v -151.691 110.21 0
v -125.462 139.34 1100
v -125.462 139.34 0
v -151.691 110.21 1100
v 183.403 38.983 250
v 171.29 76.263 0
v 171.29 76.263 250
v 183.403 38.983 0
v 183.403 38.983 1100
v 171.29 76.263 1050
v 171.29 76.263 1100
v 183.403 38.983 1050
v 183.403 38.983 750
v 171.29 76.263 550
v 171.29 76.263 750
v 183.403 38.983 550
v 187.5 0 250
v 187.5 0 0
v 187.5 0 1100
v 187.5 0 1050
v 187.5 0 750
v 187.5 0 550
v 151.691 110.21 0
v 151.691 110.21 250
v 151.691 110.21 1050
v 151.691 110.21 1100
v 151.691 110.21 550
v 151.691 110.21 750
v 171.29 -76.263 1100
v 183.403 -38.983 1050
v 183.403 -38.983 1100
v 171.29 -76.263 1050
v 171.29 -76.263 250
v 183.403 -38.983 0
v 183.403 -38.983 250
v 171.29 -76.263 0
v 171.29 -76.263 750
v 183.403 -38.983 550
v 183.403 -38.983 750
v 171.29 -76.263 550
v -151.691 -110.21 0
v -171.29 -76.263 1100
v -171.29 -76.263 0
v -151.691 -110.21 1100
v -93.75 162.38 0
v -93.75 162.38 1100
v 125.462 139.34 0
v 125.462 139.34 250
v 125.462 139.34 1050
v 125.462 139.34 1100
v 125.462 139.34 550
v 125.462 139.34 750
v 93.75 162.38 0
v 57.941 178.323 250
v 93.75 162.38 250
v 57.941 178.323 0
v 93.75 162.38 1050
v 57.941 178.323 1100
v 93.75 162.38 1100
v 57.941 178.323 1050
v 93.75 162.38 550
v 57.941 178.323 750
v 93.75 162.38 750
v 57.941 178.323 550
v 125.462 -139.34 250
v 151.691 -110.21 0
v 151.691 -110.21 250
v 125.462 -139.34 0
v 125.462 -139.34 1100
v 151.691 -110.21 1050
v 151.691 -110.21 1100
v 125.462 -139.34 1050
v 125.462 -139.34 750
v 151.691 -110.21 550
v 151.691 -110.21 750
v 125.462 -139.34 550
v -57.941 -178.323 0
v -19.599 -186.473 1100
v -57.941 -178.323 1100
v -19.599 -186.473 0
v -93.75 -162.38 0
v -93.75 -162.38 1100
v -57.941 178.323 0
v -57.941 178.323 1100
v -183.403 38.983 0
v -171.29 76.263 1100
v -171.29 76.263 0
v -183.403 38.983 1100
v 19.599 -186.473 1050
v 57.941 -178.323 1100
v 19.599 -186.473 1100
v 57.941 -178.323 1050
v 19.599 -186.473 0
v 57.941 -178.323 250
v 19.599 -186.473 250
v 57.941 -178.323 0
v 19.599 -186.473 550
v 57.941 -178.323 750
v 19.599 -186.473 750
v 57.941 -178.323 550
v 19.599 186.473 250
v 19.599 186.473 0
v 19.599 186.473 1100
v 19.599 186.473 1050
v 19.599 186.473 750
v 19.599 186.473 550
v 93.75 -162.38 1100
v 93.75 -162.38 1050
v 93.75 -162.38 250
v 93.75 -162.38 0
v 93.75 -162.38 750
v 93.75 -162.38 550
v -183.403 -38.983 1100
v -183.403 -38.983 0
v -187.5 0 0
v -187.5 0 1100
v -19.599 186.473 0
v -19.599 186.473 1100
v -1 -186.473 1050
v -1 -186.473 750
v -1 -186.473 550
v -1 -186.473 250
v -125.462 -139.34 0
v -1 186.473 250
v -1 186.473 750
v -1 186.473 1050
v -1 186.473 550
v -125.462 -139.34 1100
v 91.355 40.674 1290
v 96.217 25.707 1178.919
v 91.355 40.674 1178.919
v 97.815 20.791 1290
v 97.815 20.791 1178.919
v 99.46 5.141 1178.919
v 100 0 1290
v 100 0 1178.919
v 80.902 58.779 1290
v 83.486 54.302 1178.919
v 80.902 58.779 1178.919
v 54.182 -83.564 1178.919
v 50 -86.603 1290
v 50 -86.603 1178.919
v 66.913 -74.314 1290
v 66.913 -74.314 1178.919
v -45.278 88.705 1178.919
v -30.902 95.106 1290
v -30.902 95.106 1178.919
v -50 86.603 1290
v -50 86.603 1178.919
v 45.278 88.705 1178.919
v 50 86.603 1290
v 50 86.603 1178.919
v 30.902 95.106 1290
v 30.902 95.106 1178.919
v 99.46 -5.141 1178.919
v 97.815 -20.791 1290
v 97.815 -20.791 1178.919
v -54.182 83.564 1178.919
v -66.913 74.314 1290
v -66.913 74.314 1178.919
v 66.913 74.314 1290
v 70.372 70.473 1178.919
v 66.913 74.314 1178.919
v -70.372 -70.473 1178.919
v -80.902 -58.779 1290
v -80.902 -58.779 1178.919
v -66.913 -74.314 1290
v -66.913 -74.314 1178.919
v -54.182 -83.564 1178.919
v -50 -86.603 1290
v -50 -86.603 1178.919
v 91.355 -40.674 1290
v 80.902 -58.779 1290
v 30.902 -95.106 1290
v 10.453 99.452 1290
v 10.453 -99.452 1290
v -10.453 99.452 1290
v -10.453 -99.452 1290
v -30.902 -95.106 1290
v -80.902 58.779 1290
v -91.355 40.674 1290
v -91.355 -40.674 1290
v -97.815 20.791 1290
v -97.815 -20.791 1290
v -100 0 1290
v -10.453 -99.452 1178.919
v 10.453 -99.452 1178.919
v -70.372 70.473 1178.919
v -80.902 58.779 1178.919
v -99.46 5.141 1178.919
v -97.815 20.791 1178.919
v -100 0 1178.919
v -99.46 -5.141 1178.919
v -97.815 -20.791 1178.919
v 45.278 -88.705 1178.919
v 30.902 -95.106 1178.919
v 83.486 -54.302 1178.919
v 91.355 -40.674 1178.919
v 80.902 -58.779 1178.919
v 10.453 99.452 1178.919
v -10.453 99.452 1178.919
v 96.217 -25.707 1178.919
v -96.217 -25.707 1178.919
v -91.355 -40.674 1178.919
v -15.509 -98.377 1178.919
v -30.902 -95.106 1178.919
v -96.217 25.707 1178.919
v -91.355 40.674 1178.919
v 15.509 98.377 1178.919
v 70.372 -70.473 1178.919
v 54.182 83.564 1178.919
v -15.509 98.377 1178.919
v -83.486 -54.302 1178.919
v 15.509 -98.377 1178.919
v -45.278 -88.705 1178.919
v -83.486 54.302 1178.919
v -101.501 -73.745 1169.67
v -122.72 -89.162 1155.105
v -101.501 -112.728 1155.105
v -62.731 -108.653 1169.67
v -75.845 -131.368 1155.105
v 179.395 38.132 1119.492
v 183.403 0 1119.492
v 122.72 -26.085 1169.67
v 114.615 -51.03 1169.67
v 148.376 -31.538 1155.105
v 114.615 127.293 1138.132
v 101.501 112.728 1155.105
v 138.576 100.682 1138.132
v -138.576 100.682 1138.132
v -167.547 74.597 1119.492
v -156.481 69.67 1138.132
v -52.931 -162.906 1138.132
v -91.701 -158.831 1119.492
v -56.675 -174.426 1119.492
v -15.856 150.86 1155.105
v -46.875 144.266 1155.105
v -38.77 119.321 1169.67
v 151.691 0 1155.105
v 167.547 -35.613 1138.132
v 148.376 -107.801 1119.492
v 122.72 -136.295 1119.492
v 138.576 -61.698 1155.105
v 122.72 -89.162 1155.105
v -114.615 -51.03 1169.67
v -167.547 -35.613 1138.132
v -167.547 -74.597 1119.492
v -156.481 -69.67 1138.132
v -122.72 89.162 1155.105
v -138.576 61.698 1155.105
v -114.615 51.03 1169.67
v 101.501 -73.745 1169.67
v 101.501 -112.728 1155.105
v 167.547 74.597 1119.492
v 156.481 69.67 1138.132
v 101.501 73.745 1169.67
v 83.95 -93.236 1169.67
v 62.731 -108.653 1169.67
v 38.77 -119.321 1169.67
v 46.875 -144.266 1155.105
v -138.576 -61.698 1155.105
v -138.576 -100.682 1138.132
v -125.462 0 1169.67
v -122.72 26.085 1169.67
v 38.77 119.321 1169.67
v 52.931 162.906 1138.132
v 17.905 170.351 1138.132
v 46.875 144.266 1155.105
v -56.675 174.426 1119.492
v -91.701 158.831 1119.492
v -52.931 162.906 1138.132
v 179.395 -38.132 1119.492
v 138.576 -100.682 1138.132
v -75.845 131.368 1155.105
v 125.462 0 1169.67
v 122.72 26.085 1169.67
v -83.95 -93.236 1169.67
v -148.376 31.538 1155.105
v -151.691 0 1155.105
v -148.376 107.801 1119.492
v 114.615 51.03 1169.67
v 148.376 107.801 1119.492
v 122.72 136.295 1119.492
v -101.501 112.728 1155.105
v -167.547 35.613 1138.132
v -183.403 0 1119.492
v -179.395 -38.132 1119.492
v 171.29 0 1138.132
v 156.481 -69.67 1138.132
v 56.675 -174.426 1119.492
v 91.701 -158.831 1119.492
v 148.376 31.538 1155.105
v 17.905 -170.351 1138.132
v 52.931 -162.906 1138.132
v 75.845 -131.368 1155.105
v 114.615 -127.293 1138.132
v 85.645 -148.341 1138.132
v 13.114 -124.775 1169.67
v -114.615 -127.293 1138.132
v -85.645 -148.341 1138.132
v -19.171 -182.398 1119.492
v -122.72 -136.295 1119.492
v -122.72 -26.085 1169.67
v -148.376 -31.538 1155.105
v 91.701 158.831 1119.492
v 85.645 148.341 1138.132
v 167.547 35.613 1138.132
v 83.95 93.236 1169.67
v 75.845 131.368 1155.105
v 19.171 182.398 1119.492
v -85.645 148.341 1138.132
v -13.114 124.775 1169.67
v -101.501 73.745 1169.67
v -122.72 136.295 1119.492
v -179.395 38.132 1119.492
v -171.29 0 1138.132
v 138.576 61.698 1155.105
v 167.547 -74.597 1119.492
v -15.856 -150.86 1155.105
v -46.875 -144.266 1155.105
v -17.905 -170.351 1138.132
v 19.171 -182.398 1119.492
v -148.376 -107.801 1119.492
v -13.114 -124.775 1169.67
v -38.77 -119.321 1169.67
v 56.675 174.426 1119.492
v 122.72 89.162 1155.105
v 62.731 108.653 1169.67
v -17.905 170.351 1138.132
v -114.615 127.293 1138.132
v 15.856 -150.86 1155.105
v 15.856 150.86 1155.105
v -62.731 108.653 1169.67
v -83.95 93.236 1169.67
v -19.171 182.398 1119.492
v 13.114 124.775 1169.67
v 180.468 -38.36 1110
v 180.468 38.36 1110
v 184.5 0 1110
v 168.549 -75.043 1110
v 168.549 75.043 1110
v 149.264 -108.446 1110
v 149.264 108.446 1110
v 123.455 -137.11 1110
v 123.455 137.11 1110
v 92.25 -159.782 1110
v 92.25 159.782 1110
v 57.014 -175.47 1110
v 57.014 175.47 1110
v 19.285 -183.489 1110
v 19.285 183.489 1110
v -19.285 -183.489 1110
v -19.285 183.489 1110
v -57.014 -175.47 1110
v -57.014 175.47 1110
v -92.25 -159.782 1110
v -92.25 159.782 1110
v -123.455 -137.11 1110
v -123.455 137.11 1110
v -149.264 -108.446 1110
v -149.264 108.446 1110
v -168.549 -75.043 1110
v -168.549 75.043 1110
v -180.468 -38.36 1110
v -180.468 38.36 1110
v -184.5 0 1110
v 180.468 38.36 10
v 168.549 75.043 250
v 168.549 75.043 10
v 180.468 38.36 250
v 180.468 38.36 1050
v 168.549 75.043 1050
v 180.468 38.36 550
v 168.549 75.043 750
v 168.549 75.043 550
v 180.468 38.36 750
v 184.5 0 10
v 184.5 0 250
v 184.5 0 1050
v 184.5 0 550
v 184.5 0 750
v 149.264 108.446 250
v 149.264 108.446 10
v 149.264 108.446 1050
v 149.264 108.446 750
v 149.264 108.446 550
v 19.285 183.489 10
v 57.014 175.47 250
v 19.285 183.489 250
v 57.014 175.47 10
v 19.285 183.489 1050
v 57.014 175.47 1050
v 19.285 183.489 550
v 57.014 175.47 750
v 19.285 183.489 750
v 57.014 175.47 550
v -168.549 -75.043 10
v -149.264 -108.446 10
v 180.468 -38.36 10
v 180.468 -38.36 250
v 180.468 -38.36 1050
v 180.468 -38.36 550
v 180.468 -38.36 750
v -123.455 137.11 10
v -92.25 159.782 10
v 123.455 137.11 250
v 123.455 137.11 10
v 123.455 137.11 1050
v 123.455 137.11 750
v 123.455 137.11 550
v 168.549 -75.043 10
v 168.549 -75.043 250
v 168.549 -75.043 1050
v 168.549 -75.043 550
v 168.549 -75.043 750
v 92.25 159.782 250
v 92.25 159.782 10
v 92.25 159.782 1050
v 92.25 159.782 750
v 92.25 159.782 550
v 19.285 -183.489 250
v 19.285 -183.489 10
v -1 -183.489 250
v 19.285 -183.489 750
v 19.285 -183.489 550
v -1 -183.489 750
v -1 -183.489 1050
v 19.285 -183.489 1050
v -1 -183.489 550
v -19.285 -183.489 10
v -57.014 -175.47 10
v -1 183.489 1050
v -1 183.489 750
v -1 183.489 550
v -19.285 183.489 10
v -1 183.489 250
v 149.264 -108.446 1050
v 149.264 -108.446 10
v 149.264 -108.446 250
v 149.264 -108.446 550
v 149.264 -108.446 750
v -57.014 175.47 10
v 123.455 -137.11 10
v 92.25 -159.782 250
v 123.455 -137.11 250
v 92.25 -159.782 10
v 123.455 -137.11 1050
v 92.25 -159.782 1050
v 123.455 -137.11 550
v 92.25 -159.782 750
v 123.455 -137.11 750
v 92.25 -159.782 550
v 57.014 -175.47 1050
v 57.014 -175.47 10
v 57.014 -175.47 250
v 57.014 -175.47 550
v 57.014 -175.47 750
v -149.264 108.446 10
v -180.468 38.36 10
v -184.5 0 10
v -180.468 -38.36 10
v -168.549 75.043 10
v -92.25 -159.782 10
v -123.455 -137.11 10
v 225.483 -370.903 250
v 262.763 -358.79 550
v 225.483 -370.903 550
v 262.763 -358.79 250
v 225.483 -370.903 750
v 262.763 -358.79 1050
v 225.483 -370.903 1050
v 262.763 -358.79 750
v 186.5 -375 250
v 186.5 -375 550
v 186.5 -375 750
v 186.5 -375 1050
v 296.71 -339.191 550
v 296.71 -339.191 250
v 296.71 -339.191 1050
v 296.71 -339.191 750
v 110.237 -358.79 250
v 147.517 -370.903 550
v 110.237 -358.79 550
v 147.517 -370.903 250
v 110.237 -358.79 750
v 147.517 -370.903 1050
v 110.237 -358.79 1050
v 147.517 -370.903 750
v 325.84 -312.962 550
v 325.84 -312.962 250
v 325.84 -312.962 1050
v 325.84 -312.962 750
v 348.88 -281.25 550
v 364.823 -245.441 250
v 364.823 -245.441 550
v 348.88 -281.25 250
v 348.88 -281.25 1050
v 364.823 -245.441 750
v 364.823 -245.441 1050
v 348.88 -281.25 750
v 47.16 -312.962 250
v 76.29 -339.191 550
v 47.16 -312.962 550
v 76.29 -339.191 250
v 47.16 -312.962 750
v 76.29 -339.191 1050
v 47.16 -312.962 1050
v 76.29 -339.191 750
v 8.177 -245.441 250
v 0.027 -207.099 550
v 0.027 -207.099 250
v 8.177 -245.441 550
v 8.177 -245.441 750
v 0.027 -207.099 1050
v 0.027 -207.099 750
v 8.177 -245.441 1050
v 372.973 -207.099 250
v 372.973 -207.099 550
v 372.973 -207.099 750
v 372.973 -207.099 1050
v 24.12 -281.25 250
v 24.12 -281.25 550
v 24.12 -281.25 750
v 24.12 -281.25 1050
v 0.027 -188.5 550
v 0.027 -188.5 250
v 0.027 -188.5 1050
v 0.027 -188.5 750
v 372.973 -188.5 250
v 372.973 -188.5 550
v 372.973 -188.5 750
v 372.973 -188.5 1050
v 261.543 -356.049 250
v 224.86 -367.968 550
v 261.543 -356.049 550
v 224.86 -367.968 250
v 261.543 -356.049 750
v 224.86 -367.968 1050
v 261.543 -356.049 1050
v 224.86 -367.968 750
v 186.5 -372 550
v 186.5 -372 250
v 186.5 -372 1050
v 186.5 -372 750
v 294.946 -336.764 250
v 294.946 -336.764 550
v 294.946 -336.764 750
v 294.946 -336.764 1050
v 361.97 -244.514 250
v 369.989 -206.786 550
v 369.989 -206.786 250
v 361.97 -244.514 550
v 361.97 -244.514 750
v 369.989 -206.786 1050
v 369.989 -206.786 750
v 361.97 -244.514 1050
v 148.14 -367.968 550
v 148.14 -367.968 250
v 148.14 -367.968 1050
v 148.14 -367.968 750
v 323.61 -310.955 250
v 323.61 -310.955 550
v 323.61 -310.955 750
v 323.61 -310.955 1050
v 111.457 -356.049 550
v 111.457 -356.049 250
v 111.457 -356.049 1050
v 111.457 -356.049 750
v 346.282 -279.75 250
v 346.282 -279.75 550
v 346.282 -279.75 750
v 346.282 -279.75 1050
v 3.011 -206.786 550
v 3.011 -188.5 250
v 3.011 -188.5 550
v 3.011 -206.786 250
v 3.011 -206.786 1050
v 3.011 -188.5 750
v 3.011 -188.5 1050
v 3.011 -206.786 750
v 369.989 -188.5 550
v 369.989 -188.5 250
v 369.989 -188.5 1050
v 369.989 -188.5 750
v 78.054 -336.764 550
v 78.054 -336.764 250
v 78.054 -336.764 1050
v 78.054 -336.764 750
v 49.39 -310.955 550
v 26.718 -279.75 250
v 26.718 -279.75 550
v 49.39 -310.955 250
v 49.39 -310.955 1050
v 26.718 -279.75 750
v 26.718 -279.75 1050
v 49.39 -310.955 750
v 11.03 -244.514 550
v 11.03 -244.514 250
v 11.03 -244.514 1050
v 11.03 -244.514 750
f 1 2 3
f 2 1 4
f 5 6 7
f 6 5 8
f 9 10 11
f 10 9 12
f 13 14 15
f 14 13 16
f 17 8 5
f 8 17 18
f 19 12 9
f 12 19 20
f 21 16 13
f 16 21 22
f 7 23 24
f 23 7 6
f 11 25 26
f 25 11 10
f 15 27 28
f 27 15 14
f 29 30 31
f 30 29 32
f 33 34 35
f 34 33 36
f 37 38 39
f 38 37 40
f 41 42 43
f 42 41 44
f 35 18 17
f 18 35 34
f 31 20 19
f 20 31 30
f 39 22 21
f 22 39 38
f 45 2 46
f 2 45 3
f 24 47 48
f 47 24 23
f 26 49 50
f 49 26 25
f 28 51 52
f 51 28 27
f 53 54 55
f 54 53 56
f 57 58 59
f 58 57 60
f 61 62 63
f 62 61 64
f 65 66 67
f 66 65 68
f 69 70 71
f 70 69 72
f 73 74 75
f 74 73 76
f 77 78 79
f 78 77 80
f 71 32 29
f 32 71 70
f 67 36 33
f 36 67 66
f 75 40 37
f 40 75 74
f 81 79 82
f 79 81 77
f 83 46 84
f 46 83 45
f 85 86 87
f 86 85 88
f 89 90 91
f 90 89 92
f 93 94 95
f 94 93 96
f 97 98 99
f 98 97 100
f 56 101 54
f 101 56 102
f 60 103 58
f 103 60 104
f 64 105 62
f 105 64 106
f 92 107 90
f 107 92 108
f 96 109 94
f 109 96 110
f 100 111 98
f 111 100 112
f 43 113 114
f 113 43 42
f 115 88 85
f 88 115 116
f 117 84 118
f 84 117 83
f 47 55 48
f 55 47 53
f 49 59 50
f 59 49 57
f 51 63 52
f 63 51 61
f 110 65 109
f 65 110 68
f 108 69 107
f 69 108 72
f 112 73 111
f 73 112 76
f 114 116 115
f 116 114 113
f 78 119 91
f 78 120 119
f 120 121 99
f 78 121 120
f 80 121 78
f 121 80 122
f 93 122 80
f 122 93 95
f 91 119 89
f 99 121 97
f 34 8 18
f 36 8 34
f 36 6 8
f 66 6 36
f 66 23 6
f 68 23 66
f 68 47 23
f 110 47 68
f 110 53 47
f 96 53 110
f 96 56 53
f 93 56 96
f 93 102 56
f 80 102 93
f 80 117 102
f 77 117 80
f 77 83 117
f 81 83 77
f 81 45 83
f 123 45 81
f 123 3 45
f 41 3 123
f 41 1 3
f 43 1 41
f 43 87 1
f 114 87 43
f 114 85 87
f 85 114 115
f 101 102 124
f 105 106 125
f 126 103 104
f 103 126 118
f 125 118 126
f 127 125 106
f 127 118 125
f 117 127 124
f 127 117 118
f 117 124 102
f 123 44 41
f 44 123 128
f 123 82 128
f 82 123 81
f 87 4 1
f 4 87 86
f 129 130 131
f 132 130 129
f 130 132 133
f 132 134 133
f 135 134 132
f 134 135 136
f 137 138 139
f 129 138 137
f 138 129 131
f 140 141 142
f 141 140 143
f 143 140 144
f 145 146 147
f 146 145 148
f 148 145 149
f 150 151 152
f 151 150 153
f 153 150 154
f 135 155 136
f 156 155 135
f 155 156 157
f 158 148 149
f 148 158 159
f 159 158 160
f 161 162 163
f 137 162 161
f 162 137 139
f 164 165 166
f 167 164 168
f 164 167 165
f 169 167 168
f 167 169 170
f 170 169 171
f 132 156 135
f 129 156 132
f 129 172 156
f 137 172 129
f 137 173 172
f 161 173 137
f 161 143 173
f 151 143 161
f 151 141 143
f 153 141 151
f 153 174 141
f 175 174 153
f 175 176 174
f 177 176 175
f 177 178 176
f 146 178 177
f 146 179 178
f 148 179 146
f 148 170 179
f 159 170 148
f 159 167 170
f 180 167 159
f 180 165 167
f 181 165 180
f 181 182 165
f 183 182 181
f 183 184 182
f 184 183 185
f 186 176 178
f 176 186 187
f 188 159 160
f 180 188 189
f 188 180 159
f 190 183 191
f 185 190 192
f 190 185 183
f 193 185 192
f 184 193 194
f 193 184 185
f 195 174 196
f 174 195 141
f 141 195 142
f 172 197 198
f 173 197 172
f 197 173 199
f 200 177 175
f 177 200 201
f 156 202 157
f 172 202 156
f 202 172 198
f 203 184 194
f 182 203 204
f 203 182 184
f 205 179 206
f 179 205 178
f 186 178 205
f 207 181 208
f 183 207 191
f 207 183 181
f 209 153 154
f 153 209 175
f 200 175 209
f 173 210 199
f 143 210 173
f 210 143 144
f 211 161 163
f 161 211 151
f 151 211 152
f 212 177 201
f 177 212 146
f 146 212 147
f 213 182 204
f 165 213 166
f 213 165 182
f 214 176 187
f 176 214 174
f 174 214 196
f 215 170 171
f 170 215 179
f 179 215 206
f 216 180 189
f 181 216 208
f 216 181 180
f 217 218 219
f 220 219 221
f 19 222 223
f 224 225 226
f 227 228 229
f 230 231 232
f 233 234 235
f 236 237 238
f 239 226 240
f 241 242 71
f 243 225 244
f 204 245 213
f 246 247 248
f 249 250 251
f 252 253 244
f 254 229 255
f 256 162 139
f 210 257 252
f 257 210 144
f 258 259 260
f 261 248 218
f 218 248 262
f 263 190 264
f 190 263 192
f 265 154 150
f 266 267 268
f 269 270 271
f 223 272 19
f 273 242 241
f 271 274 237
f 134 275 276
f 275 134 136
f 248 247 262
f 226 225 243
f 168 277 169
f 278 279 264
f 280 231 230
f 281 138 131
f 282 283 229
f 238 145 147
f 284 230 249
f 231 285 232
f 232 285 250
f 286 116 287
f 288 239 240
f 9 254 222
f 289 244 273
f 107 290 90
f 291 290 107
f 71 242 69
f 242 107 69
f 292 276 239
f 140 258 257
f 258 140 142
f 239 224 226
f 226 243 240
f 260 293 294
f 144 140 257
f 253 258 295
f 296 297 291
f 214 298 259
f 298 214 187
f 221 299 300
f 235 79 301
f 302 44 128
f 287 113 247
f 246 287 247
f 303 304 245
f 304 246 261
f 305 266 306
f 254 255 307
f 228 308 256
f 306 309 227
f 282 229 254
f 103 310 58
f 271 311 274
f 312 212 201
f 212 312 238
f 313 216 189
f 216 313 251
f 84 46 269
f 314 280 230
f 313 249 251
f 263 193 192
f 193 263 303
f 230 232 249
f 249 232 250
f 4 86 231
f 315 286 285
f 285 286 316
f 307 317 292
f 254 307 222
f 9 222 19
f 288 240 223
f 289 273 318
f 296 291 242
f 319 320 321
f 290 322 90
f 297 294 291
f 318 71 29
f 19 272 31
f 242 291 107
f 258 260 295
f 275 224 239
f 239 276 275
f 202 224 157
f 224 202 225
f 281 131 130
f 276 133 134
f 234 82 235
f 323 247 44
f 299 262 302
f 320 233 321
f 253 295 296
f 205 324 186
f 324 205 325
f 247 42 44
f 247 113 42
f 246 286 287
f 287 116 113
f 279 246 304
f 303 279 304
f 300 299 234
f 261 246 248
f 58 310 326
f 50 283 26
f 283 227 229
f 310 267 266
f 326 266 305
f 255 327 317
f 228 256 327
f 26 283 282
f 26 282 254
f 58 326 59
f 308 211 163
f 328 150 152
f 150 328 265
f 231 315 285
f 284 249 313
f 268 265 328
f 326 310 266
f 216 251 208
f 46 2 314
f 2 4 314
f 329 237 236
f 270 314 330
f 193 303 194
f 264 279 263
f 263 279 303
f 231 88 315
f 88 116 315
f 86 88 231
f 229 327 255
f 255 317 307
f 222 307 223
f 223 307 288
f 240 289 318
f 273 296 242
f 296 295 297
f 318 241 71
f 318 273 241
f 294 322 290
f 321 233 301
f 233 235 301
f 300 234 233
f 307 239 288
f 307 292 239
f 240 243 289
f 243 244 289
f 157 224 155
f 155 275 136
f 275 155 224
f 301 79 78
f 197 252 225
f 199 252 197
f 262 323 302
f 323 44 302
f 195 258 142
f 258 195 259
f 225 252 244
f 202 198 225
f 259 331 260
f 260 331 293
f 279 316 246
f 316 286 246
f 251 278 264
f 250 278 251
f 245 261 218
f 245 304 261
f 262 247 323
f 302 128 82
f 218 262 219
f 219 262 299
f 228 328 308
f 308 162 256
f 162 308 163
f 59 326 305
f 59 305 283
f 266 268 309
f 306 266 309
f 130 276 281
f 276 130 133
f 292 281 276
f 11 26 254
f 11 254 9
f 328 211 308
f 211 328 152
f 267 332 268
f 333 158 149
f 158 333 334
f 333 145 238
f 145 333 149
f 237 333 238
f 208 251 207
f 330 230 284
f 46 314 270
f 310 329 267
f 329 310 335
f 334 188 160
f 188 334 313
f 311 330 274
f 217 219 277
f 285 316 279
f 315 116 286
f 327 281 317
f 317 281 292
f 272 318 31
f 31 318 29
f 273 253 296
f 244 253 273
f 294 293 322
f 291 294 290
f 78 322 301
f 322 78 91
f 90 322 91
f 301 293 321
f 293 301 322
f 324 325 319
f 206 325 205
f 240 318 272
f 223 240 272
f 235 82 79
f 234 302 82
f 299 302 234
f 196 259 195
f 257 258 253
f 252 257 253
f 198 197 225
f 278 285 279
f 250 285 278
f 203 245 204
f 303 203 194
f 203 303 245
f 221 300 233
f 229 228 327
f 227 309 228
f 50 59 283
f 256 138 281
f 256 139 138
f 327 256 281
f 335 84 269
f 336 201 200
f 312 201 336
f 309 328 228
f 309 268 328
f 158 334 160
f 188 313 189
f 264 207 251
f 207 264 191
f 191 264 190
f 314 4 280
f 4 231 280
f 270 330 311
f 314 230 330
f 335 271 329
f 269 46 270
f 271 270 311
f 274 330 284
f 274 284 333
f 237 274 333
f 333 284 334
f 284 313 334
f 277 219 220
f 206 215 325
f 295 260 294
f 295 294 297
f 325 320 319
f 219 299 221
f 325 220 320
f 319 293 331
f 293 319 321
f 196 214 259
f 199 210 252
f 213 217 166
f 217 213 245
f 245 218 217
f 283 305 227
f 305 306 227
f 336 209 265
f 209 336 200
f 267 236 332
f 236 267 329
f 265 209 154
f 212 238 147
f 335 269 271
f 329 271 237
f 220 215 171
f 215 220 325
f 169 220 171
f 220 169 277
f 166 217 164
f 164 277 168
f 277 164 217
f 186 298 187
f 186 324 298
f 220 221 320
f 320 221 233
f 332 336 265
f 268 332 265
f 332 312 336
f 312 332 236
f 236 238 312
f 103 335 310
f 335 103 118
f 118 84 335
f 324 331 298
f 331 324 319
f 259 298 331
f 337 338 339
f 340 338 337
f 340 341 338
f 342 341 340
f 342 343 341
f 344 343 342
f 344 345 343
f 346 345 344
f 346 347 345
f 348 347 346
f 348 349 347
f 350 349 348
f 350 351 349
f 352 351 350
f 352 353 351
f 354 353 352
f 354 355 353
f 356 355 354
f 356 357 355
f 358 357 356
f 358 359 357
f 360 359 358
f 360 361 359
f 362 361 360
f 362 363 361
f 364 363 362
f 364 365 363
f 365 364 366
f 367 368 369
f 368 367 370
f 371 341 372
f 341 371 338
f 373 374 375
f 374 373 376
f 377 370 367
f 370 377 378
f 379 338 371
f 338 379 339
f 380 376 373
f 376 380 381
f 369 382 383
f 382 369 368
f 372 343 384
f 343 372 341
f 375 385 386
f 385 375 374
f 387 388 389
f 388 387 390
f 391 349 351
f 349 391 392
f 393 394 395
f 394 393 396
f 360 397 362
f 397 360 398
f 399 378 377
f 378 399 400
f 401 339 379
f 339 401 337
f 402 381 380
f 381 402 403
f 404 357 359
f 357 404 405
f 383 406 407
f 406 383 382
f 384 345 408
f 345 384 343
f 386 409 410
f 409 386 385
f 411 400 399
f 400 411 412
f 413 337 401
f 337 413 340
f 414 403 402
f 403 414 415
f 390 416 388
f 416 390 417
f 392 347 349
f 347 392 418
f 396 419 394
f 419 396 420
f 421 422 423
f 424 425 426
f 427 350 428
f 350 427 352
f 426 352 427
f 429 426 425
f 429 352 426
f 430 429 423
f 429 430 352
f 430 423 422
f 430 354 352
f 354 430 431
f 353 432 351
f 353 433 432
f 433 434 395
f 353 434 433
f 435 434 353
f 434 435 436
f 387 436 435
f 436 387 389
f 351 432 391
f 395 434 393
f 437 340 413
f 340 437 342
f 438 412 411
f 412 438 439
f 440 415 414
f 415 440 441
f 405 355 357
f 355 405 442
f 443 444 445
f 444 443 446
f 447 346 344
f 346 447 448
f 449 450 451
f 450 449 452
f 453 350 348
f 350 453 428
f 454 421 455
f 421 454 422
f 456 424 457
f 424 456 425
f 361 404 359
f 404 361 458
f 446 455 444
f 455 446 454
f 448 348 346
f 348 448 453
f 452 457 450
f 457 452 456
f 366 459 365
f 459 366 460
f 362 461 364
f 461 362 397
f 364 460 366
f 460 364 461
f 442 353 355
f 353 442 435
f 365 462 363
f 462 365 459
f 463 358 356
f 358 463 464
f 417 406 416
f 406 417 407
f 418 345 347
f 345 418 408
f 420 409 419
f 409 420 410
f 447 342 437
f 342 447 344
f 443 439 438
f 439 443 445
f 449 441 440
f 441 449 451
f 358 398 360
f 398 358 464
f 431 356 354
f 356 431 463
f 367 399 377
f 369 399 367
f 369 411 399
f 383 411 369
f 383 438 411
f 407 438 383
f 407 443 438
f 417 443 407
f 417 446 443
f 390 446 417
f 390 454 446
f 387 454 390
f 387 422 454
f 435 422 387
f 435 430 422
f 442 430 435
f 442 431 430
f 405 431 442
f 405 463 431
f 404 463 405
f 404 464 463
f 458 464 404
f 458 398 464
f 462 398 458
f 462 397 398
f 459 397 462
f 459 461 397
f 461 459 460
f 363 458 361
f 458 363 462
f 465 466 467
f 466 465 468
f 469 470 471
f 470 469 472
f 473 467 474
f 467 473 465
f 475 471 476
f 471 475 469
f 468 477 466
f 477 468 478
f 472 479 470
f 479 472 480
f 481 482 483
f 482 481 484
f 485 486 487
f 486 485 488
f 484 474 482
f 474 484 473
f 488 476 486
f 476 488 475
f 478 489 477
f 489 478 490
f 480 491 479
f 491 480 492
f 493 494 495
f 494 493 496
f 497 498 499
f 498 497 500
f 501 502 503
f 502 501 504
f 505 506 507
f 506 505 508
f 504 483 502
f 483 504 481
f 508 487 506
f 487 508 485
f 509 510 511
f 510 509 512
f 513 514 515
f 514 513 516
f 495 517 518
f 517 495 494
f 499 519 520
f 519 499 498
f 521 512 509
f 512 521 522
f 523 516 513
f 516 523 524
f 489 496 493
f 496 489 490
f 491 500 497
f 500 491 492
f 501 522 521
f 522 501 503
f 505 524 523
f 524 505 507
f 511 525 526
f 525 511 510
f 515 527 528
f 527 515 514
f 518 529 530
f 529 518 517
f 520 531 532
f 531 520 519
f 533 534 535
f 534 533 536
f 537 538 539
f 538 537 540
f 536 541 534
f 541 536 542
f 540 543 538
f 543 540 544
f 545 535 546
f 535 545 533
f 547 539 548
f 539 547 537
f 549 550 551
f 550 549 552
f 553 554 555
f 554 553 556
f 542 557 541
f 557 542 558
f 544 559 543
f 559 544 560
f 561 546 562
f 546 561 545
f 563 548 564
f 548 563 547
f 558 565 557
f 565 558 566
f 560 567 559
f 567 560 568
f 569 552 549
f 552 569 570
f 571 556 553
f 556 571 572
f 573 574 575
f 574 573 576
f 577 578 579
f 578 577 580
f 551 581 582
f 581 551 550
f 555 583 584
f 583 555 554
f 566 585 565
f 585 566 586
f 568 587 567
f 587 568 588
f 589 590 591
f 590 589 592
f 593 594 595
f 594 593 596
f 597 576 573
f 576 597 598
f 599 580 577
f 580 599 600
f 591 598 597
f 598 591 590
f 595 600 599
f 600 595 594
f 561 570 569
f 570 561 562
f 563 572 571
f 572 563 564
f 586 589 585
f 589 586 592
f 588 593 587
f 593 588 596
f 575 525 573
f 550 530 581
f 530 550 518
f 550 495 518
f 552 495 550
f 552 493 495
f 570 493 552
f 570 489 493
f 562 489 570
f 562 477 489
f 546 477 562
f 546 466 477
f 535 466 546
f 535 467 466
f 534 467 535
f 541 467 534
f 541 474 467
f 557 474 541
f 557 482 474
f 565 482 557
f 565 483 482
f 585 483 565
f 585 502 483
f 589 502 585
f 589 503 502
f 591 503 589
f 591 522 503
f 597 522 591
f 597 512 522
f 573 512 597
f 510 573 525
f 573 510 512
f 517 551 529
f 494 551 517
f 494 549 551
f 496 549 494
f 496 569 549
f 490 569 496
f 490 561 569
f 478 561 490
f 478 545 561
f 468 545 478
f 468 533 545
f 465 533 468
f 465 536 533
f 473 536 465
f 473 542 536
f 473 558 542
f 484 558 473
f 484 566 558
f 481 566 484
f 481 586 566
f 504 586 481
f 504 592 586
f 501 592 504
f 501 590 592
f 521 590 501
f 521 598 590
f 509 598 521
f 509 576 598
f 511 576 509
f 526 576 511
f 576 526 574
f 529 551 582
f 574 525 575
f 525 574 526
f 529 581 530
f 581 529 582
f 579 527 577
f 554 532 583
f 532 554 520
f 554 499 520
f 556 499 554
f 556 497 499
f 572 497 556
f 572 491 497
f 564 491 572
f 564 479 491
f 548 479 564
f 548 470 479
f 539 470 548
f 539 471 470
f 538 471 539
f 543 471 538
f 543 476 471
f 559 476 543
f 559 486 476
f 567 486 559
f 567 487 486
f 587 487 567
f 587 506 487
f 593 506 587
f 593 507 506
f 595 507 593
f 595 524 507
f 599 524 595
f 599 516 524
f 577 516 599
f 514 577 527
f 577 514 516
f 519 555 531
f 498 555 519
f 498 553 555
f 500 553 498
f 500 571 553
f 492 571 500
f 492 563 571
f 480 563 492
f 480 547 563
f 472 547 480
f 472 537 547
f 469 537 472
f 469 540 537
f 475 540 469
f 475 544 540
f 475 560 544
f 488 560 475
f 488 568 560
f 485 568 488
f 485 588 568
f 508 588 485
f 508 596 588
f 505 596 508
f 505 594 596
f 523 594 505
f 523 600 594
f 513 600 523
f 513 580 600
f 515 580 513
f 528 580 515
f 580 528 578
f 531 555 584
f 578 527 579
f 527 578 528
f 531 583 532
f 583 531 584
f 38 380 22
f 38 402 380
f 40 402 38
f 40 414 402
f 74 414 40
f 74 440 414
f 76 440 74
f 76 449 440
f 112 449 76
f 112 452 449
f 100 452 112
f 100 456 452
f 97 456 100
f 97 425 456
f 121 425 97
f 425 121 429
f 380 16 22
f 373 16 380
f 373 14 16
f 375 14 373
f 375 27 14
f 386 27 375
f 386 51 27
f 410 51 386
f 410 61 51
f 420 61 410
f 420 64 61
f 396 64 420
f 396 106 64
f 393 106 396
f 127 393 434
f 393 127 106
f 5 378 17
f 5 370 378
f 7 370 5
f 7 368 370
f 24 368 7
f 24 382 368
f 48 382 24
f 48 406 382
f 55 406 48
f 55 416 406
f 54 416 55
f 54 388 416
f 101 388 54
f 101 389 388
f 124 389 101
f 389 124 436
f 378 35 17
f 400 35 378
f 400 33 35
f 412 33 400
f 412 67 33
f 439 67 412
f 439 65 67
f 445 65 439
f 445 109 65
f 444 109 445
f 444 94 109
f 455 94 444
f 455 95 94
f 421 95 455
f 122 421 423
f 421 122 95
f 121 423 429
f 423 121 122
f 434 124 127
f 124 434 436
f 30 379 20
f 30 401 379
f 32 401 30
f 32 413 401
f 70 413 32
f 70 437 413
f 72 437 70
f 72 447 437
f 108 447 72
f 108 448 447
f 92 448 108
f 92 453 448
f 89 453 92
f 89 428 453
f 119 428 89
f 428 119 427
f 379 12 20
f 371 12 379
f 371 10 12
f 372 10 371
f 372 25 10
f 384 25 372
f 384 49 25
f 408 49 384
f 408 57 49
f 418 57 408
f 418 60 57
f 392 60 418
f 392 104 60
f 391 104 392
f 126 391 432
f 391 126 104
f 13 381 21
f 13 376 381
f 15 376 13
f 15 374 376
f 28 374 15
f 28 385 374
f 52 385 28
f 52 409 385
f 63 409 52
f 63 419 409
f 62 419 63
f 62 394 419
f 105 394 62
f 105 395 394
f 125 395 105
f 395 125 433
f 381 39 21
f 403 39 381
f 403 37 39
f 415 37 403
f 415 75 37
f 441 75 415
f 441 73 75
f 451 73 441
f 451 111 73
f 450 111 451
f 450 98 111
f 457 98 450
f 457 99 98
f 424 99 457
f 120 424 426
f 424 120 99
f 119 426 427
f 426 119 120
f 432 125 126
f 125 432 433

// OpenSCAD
translate([-1, -375/2, 0])
rotate([0,0,-90])
translate([0, 375/2, 0]) {
    intersection() {
        gas();
        translate([200+1, 0, 400])
            cube([400, 400, 300], center=true);
    }
    intersection() {
        gas();
        translate([200+1, 0, 900])
            cube([400, 400, 300], center=true);
    }
}

difference() {
    gas();
    translate([200-1, 0, 400])
        cube([400, 400, 300], center=true);

    translate([200-1, 0, 900])
        cube([400, 400, 300], center=true);
}

module gas() {
    difference() {
        union() {
            cylinder(
                d=375,
                h=1100
            );
            cylinder(
                d=200,
                h=1290
            );
            translate([0, 0, 1100])
                scale([1, 1, .5])
                    sphere(d=375);
        }
        translate([0, 0, 10])
            cylinder(
                d=375-6,
                h=1100
            );
    }
}
